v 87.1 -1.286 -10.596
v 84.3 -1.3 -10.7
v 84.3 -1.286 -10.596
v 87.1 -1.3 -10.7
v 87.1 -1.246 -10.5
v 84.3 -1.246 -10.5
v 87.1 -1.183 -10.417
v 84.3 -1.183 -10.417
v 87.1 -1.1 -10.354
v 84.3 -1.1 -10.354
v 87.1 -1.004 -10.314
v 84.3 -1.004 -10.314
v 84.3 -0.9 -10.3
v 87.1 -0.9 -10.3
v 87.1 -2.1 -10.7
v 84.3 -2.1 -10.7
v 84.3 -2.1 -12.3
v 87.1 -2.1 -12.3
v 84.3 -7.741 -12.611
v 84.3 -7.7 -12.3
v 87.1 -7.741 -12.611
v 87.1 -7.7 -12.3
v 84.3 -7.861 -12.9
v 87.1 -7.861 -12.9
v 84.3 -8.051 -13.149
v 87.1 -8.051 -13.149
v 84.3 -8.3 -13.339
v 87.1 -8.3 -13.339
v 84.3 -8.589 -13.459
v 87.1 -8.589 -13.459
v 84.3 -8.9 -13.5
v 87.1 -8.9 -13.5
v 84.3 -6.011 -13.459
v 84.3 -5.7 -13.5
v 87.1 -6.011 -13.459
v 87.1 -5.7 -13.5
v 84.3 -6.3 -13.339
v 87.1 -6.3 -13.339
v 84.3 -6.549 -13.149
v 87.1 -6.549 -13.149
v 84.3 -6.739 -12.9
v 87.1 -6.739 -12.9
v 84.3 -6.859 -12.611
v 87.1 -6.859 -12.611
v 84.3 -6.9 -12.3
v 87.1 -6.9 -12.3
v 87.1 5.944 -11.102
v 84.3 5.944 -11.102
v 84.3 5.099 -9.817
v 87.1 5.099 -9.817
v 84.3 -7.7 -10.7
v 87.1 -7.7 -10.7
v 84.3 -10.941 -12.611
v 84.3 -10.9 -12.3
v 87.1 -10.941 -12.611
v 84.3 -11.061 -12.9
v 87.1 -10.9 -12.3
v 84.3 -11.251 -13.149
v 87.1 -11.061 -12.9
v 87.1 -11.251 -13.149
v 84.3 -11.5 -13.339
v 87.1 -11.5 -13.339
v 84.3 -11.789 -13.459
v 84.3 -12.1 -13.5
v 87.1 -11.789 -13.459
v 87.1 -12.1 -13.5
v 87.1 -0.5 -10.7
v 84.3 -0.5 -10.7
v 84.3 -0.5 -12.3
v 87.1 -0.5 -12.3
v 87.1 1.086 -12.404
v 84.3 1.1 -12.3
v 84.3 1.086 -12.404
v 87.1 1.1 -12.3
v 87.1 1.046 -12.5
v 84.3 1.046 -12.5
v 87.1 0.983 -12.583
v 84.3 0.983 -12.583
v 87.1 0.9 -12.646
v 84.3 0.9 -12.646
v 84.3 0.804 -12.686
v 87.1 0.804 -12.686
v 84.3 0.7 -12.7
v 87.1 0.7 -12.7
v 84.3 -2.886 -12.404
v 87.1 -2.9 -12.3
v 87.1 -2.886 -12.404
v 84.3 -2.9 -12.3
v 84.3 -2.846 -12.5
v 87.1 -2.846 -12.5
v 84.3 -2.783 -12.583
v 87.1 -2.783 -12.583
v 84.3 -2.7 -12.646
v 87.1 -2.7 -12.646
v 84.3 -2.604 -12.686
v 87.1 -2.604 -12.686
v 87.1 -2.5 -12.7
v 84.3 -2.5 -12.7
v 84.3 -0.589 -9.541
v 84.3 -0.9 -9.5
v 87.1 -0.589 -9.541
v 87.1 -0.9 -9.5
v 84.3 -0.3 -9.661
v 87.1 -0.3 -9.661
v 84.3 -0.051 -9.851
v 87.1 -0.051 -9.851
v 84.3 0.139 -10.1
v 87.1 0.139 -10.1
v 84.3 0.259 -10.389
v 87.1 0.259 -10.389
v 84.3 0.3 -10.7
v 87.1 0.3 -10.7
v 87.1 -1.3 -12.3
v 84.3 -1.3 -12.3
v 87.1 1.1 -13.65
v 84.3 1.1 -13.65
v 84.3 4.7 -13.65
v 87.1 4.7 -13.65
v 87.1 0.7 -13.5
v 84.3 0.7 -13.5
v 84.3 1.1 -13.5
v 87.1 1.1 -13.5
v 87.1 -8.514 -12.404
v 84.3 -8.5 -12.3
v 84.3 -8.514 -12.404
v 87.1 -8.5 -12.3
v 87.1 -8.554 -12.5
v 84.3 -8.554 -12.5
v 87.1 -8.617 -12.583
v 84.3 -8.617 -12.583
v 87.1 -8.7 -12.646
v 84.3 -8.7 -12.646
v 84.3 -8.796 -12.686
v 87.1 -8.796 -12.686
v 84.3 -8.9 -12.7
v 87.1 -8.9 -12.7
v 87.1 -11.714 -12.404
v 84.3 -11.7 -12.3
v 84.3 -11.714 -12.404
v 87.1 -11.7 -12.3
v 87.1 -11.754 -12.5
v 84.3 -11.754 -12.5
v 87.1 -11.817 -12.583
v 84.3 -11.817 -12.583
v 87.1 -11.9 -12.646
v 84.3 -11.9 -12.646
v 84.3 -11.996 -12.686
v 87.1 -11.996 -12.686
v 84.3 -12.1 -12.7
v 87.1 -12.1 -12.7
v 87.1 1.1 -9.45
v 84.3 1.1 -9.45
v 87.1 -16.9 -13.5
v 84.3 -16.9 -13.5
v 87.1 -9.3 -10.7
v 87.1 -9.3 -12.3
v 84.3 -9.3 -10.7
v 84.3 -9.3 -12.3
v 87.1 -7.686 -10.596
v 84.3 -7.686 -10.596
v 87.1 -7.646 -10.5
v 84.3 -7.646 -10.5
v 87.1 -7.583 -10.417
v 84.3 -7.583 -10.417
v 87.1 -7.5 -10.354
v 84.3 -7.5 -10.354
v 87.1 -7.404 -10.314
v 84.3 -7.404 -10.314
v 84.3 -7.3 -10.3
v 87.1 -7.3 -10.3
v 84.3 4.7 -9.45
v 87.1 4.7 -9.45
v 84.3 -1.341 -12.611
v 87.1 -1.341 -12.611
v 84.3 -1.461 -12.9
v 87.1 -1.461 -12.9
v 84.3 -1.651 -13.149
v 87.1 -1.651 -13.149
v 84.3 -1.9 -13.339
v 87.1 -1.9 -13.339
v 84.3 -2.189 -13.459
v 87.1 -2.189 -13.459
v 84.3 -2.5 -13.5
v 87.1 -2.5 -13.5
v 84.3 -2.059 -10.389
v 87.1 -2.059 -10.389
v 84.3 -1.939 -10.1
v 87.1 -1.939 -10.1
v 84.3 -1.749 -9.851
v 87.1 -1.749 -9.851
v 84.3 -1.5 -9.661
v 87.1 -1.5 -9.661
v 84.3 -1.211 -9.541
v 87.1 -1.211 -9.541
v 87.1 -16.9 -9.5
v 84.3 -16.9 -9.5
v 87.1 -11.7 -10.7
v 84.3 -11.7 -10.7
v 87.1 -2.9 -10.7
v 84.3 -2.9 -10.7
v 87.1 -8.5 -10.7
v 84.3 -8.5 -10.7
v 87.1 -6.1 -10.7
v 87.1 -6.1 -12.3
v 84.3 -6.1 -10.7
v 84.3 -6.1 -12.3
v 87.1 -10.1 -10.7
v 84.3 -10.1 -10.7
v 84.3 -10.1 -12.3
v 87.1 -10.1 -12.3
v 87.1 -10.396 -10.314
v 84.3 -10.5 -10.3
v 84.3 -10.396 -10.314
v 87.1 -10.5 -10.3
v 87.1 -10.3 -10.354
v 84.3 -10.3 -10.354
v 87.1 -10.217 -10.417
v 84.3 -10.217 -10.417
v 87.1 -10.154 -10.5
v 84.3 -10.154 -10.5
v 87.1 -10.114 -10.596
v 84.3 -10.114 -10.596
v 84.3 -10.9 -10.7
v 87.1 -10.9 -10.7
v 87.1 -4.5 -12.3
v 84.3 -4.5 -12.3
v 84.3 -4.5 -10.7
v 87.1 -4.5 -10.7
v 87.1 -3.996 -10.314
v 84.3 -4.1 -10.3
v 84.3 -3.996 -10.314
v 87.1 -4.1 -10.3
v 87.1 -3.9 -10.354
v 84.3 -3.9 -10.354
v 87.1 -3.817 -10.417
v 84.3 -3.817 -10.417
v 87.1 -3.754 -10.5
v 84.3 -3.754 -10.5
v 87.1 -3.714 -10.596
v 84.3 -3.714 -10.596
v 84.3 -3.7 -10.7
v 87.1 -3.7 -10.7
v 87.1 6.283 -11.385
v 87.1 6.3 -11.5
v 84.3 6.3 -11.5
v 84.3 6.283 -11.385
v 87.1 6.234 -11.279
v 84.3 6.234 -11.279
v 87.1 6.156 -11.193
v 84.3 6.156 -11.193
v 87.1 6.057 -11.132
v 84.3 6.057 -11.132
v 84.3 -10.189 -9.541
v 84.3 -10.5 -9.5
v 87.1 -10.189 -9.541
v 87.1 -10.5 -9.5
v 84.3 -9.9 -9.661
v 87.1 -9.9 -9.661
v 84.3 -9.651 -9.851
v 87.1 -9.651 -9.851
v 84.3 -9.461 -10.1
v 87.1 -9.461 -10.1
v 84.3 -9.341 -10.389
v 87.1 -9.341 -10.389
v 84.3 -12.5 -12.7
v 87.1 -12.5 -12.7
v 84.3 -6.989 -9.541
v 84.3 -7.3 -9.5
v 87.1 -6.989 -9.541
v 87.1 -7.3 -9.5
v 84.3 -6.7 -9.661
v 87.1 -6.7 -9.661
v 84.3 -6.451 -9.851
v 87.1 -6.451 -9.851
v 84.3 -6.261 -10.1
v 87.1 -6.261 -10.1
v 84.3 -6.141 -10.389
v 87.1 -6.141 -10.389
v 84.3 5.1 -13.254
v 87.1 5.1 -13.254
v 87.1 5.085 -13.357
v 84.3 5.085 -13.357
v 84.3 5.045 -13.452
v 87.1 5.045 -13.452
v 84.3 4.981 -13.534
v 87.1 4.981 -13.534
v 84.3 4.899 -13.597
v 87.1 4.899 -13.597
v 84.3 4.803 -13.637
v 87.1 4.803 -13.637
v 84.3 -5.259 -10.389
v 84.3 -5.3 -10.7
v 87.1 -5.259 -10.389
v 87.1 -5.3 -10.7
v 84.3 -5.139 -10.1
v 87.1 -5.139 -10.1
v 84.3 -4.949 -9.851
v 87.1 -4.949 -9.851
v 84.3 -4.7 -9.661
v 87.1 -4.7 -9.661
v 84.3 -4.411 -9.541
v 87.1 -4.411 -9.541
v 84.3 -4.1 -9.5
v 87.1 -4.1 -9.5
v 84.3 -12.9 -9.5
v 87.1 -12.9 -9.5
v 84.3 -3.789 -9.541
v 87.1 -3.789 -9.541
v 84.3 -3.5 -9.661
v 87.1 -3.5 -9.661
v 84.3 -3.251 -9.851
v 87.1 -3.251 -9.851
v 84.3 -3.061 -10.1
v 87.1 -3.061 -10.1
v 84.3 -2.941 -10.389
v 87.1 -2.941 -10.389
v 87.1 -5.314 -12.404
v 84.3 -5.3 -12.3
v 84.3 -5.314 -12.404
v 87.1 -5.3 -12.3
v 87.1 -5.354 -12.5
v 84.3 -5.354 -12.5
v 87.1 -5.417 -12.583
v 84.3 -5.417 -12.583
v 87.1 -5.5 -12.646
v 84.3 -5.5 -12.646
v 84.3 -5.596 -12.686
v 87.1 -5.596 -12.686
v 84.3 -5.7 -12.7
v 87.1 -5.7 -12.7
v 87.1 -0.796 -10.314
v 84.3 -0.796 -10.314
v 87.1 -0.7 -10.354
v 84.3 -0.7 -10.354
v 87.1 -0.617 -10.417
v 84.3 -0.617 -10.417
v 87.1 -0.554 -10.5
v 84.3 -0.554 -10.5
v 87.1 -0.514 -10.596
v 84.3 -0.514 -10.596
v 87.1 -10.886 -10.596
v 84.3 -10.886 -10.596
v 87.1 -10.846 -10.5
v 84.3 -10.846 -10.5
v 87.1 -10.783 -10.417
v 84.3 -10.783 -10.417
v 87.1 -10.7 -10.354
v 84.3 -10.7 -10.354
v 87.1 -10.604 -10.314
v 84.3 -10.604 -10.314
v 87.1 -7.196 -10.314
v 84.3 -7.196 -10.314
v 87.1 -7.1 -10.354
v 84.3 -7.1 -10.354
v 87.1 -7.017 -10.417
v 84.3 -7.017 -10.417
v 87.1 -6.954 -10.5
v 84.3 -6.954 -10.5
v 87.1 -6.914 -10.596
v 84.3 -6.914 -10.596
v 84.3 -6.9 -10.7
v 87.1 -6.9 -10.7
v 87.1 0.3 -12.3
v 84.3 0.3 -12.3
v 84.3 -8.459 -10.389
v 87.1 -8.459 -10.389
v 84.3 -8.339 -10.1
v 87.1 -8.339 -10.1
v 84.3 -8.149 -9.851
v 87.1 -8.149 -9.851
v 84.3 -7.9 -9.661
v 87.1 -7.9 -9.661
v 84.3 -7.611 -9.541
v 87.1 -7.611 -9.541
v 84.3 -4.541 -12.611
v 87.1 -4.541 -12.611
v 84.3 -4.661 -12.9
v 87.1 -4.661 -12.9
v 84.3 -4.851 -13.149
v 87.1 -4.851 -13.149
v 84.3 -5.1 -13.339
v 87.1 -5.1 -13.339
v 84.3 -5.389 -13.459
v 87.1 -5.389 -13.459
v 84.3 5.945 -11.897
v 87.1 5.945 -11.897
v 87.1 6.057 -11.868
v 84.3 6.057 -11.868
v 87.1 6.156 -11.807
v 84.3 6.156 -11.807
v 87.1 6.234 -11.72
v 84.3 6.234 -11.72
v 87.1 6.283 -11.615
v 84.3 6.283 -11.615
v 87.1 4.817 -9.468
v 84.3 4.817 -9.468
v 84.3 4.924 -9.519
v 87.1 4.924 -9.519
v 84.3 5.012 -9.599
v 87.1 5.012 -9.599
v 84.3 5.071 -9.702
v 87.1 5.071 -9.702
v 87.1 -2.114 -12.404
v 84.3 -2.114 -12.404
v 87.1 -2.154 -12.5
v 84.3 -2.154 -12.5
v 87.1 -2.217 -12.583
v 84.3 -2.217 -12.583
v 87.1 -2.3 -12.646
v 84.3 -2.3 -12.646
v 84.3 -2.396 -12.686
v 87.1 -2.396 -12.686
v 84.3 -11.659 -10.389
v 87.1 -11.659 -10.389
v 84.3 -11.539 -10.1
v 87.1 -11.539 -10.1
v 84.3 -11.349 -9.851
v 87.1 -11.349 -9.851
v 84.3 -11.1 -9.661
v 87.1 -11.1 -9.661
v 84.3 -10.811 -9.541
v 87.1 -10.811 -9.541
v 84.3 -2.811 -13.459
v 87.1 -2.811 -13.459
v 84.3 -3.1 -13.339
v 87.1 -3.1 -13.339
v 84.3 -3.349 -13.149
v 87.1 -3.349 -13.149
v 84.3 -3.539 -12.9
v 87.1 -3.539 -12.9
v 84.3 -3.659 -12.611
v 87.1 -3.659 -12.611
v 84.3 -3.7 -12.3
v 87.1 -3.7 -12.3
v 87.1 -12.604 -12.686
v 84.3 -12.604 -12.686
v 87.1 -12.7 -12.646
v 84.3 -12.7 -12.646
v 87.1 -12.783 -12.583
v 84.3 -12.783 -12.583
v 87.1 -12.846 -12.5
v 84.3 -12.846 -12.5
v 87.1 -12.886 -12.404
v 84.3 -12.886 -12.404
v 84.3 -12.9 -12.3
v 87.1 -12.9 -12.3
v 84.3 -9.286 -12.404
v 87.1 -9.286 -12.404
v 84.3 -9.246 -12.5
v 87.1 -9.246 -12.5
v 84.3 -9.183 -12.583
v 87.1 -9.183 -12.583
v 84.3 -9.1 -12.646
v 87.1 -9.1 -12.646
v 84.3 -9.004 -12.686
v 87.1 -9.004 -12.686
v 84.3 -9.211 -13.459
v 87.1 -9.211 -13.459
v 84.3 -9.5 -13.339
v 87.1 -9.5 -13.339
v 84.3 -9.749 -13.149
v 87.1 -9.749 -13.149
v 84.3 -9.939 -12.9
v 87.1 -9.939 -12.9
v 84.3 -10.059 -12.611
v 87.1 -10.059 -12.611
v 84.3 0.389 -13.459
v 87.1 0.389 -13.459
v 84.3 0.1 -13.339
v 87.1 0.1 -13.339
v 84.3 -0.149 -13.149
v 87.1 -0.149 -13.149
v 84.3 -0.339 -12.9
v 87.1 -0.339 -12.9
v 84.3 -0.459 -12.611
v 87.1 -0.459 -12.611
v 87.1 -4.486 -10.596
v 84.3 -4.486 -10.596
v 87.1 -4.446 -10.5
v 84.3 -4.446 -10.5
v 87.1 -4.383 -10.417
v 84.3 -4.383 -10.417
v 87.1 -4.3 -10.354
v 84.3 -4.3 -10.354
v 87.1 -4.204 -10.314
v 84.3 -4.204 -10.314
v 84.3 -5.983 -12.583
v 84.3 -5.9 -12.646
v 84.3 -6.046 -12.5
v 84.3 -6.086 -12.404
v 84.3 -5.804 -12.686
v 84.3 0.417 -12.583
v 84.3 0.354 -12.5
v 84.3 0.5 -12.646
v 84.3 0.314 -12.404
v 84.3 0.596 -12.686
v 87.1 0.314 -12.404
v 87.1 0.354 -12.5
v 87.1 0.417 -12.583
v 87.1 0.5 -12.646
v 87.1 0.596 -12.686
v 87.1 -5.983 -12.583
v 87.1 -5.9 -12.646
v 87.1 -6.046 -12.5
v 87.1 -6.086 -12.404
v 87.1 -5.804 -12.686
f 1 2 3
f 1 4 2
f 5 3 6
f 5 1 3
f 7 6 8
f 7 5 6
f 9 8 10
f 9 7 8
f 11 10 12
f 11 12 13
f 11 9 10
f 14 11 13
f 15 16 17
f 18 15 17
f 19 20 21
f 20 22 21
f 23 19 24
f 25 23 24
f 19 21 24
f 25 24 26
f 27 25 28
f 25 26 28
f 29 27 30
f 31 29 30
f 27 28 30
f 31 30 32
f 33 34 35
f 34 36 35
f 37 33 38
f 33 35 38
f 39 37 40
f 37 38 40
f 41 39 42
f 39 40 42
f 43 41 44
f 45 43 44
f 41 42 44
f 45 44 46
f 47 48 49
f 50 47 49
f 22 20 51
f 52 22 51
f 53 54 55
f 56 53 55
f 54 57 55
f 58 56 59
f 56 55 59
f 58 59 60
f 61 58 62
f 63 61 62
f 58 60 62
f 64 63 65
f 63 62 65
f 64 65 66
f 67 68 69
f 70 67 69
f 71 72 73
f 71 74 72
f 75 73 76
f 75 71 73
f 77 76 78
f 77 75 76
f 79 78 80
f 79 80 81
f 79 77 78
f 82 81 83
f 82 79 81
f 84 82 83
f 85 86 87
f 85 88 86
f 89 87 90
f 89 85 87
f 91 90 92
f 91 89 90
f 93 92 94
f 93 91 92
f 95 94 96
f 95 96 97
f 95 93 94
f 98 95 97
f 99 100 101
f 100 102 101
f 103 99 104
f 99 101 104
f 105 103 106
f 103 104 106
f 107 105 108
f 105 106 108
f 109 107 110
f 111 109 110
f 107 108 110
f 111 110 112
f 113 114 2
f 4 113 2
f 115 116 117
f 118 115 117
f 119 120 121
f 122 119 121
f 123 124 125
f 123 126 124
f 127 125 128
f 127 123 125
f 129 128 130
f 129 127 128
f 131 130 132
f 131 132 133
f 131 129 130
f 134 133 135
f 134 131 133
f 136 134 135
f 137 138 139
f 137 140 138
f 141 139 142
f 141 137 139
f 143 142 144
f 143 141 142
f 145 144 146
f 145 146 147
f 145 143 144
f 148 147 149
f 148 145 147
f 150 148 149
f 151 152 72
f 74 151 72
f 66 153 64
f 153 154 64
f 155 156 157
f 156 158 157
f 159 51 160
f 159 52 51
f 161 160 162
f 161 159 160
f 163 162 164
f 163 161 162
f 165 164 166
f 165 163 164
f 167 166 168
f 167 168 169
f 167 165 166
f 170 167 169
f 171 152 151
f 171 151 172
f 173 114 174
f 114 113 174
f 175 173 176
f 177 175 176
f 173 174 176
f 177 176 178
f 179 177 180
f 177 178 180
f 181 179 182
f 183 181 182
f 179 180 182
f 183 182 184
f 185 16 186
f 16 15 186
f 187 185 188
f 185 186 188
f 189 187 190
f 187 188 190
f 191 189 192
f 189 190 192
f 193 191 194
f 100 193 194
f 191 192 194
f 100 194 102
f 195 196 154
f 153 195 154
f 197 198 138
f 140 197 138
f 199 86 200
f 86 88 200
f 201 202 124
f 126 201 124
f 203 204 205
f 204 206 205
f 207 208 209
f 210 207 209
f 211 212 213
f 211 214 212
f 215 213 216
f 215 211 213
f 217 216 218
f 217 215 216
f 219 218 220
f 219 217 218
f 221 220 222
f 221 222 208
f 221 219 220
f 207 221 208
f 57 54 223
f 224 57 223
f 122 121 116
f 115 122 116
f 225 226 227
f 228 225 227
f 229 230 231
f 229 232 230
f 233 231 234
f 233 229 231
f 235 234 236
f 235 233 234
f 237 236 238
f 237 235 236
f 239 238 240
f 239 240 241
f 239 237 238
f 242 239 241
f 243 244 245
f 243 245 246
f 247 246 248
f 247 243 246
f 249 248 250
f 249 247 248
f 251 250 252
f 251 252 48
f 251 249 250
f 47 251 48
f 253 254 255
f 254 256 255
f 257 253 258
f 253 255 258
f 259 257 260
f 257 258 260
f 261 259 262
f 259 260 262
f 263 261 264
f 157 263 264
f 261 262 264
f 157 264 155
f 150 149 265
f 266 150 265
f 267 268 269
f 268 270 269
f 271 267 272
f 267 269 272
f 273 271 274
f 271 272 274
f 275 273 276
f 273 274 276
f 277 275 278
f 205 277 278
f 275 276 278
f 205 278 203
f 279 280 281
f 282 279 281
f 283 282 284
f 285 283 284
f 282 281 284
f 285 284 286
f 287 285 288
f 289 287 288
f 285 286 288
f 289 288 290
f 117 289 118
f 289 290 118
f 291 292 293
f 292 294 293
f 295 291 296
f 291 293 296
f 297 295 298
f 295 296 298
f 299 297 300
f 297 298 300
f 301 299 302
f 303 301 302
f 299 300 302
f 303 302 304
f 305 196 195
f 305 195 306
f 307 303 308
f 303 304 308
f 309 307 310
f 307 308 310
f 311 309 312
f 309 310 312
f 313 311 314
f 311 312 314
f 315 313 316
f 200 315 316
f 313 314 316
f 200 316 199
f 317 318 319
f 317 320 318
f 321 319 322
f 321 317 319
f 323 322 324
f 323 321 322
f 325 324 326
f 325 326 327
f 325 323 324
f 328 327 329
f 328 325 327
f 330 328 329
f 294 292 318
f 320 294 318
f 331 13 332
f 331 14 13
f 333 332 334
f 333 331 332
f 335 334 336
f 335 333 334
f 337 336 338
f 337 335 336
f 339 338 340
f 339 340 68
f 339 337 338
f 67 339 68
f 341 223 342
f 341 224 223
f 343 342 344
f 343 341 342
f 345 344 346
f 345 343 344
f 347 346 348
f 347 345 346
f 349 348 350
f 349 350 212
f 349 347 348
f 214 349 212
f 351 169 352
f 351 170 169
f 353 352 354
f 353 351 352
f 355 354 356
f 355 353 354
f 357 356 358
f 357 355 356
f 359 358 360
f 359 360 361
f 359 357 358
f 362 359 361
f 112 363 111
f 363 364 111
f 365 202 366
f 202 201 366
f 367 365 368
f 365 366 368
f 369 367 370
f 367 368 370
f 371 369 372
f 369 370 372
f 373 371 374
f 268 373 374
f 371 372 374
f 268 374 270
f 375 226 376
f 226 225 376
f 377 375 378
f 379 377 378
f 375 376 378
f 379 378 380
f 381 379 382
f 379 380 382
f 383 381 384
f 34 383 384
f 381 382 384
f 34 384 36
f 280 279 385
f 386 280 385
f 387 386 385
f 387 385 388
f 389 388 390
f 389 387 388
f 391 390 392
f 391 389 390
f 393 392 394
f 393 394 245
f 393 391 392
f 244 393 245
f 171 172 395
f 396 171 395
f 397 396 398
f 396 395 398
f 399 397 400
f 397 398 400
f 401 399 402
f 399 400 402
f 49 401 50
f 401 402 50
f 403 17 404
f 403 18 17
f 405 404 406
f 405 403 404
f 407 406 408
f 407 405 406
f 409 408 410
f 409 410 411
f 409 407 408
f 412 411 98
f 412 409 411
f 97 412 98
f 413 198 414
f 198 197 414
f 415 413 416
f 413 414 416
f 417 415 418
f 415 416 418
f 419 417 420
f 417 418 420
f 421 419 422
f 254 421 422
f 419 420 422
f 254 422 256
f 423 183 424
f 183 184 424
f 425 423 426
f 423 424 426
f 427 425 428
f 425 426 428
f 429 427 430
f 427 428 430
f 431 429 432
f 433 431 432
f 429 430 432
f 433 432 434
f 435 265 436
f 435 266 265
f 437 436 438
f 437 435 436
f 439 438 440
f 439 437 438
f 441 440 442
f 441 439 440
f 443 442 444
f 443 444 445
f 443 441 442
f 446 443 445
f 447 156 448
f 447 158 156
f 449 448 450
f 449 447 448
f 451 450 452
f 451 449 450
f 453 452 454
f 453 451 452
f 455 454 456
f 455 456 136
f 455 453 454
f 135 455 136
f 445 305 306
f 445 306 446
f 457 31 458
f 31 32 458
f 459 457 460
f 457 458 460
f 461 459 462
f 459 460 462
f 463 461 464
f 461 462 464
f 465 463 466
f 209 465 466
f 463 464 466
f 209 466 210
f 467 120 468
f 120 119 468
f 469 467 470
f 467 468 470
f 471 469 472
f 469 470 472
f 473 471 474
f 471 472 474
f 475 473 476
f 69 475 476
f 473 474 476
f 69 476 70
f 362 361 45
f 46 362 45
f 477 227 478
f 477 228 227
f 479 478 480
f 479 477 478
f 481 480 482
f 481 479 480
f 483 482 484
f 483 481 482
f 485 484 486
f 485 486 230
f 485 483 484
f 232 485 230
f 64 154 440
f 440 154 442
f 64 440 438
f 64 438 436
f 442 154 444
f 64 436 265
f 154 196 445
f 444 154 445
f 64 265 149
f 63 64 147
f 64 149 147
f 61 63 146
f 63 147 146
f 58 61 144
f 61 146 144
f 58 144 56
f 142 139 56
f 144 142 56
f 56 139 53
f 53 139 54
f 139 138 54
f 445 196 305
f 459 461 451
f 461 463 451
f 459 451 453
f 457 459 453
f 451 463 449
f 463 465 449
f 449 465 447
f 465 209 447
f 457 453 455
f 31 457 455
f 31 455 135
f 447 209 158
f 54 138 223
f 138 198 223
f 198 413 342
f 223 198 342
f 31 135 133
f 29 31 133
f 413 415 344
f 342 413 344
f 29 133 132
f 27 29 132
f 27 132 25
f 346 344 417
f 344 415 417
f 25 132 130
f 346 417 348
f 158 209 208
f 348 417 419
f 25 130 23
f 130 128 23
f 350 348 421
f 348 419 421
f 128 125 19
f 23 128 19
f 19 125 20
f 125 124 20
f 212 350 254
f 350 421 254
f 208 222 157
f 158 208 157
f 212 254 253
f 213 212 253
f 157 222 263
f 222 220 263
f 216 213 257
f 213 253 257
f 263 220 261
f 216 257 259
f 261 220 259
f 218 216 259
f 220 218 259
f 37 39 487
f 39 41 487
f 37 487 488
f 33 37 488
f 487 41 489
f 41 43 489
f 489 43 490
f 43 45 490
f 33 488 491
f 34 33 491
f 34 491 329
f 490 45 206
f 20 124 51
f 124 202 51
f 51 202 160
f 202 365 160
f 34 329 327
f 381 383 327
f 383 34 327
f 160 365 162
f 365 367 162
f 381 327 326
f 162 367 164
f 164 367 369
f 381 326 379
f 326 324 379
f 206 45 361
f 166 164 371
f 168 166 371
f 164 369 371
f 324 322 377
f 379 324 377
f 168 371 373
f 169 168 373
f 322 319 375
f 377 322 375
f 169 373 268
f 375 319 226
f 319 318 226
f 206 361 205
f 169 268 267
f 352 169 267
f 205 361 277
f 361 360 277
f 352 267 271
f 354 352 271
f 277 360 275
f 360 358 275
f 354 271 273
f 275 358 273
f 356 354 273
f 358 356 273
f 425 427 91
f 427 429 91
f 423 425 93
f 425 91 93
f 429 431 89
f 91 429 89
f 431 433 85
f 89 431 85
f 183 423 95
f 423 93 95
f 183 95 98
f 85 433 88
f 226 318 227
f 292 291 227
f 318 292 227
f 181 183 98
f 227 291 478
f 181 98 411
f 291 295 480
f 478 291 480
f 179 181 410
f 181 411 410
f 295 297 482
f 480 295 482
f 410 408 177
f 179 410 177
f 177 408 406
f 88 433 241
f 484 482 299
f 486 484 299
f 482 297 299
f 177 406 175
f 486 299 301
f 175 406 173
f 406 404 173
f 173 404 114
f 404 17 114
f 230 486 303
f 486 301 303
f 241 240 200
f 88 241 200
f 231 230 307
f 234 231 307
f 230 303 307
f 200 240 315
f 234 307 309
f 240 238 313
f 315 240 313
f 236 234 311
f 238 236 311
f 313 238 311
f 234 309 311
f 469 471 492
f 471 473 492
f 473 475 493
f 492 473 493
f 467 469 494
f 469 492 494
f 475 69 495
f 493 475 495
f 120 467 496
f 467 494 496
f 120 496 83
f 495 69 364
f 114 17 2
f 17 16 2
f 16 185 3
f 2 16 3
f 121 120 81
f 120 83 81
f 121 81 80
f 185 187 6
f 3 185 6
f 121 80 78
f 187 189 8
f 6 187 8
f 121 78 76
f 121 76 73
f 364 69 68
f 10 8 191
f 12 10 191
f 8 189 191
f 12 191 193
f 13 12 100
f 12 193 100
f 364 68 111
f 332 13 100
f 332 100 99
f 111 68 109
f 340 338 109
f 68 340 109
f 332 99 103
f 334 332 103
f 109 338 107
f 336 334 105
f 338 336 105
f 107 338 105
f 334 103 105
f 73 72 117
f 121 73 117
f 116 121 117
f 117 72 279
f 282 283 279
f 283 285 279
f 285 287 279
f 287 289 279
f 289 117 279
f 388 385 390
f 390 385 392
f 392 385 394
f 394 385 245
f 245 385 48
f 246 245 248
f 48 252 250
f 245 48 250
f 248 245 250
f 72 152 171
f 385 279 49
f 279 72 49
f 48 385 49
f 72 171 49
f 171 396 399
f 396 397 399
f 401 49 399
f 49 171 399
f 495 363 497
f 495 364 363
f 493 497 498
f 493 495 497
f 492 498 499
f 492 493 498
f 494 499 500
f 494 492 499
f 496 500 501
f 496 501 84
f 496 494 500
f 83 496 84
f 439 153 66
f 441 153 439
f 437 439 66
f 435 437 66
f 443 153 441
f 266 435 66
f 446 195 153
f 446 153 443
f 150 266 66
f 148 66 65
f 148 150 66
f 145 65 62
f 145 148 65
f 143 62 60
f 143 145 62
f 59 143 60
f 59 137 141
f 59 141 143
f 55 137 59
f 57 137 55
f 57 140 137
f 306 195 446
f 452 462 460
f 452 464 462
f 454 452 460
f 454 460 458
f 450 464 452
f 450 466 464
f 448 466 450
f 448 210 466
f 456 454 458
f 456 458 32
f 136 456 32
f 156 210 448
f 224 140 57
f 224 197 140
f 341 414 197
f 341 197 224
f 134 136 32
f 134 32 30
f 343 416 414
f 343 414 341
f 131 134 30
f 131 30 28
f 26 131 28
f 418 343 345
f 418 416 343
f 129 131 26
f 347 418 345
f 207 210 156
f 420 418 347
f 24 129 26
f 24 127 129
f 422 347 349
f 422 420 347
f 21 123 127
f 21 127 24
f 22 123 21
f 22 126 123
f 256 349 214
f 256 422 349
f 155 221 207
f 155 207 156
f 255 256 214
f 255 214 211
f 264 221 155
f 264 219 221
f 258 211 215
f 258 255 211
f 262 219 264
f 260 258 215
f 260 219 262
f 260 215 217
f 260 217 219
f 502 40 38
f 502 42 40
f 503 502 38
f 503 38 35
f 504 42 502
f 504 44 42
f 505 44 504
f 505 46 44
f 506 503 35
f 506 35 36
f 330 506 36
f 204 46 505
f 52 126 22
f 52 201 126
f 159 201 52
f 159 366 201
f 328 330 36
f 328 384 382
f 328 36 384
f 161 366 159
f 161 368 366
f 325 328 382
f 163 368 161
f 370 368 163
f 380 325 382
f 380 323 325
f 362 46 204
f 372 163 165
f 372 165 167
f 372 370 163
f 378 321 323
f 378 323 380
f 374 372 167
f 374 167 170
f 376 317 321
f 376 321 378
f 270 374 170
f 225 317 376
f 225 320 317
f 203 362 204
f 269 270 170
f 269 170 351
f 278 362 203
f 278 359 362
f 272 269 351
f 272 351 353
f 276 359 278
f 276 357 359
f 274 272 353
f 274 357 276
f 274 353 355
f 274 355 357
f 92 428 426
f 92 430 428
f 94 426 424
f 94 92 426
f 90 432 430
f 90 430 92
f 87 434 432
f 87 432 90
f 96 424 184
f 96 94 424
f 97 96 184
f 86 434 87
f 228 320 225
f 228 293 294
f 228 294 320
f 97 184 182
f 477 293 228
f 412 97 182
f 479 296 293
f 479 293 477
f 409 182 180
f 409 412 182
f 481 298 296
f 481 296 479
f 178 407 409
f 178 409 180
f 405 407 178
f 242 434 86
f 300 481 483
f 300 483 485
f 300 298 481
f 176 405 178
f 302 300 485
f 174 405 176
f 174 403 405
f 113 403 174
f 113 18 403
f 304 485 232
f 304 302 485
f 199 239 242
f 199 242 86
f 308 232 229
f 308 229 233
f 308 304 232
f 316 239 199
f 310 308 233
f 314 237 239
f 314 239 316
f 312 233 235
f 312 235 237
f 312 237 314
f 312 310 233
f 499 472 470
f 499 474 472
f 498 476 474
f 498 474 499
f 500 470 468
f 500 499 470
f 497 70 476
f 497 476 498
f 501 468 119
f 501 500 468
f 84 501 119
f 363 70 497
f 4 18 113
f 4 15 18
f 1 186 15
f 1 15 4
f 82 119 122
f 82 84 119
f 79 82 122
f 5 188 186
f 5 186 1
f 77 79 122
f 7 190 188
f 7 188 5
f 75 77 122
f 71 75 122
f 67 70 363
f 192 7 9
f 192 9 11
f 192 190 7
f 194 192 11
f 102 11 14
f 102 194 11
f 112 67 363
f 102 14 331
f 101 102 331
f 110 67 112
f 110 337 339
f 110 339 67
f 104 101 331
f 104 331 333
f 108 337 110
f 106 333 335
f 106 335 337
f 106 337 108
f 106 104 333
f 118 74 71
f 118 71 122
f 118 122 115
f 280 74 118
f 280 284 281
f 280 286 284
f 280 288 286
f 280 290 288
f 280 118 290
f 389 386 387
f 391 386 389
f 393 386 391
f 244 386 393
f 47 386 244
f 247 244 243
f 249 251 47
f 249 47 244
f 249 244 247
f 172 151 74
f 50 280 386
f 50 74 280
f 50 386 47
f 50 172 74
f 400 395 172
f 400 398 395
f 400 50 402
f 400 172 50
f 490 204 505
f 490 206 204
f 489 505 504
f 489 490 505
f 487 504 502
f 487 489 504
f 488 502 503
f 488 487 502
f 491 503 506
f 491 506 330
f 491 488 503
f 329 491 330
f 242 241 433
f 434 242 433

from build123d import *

# Parameters (mm, degrees)
AUFSATZ_LINEAR_AUSTRAGEN3_DEPTH = 2.8
VERRUNDUNG2_R                   = 0.4
VERRUNDUNG5_R                   = 1.2
VERRUNDUNG6_R                   = 1.2
LINEARES_MUSTER1_COUNT          = 5
LINEARES_MUSTER1_PITCH          = 3.2
SKIZZE5_W                       = 4
SKIZZE5_H                       = 4
SKIZZE5_W_2                     = 4.2
AUFSATZ_LINEAR_AUSTRAGEN4_DEPTH = 2.8
VERRUNDUNG3_R                   = 0.4
VERRUNDUNG4_R                   = 0.4
VERRUNDUNG8_R                   = 1.2
FASE1_START                     = 84.3
FASE1_DEPTH                     = 2.8


with BuildPart() as part:
    # Aufsatz-Linear austragen3: read off the stored shape, not the designer's step
    # Aufsatz-Linear austragen3 outline → Aufsatz-Linear austragen3 (new body)
    with BuildSketch(Plane(origin=(84.3, 0, 0), x_dir=(0, 0, -1), z_dir=(1, 0, 0))):
        Polygon((11.9, 5.1), (11.9, 6.3), (11.1, 6.3), (11.1, 4.3), (12.7, 4.3), (12.7, 3.5), (9.5, 3.5), (9.5, 1.1), (12.7, 1.1), (12.7, -0.1), (13.5, -0.1), (13.5, 1.9), (10.3, 1.9), (10.3, 2.7), (13.5, 2.7), (13.5, 5.1), align=None)
    extrude(amount=AUFSATZ_LINEAR_AUSTRAGEN3_DEPTH)

    # Verrundung2
    verrundung2_edges = [part.edges().sort_by_distance(p)[0] for p in [
        (85.7, 1.9, -10.3),
        (85.7, 2.7, -10.3),
        (85.7, 3.5, -12.7),
        (85.7, 4.3, -12.7),
        (85.7, 6.3, -11.1),
        (85.7, 6.3, -11.9),
        (85.7, 1.1, -12.7),
    ]]
    fillet(verrundung2_edges, radius=VERRUNDUNG2_R - 0.0001)  # a hair under: the kernel refuses the full size


with BuildPart() as body_2:
    # Abspalten1: the piece on the far side of the plane
    add(part.part)
    split(bisect_by=Plane.ZX.offset(3.5), keep=Keep.BOTTOM)

    # Verrundung5
    verrundung5_edges = [body_2.edges().sort_by_distance(p)[0] for p in [
        (85.7, 1.1, -9.5),
        (85.7, 3.5, -9.5),
    ]]
    fillet(verrundung5_edges, radius=VERRUNDUNG5_R - 0.0001)  # a hair under: the kernel refuses the full size


with BuildPart() as part_1:
    add(part.part)

    # Abspalten1
    split(bisect_by=Plane.ZX.offset(3.5), keep=Keep.TOP)

    # Verrundung6
    verrundung6_edges = [part_1.edges().sort_by_distance(p)[0] for p in [
        (85.7, 5.1, -13.5),
    ]]
    fillet(verrundung6_edges, radius=VERRUNDUNG6_R)


with BuildPart() as lineares_muster1_1:
    # Lineares Muster1: pattern copy
    add(body_2.part.moved(Location(Vector(0, -1, 0) * (1 * LINEARES_MUSTER1_PITCH))))


with BuildPart() as lineares_muster1_2:
    # Lineares Muster1: pattern copy
    add(body_2.part.moved(Location(Vector(0, -1, 0) * (2 * LINEARES_MUSTER1_PITCH))))


with BuildPart() as lineares_muster1_3:
    # Lineares Muster1: pattern copy
    add(body_2.part.moved(Location(Vector(0, -1, 0) * (3 * LINEARES_MUSTER1_PITCH))))


with BuildPart() as lineares_muster1_4:
    # Lineares Muster1: pattern copy
    add(body_2.part.moved(Location(Vector(0, -1, 0) * (4 * LINEARES_MUSTER1_PITCH))))

    # Skizze5 → Aufsatz-Linear austragen4 (add)
    with BuildSketch(Plane(origin=(84.3, 0, 0), x_dir=(0, 0, -1), z_dir=(1, 0, 0))):
        with Locations((11.5, -14.9)):
            Rectangle(SKIZZE5_W, SKIZZE5_H)
        with Locations((11.55, 3.1)):
            Rectangle(SKIZZE5_W_2, SKIZZE5_H)
    extrude(amount=AUFSATZ_LINEAR_AUSTRAGEN4_DEPTH)


with BuildPart() as aufsatz_linear_austragen4_piece_1:
    # of the separate pieces the step leaves, piece 1, a body of its own (aufsatz_linear_austragen4_pieces)
    add(lineares_muster1_4.part.solids().sort_by_distance((84.3, -9.3, -10.6999))[0])

    # Verrundung3
    verrundung3_edges = [aufsatz_linear_austragen4_piece_1.edges().sort_by_distance(p)[0] for p in [
        (85.7, -12.9, -12.7),
    ]]
    fillet(verrundung3_edges, radius=VERRUNDUNG3_R)


with BuildPart() as aufsatz_linear_austragen4_piece_2:
    # of the separate pieces the step leaves, piece 2, a body of its own (aufsatz_linear_austragen4_pieces)
    add(lineares_muster1_4.part.solids().sort_by_distance((84.3, 1.1, -9.45))[0])


with BuildPart() as part_2:
    add(part_1.part)

    # Kombinieren1: union body 2, Lineares Muster1_1, Lineares Muster1_2, Lineares Muster1_3, Aufsatz-Linear austragen4 piece 1, Aufsatz-Linear austragen4 piece 2
    add(body_2.part)
    add(lineares_muster1_1.part)
    add(lineares_muster1_2.part)
    add(lineares_muster1_3.part)
    add(aufsatz_linear_austragen4_piece_1.part)
    add(aufsatz_linear_austragen4_piece_2.part)

    # Verrundung4
    verrundung4_edges = [part_2.edges().sort_by_distance(p)[0] for p in [
        (85.7, -9.3, -12.7),
        (85.7, -6.1, -12.7),
        (85.7, -2.9, -12.7),
        (85.7, 0.3, -12.7),
        (85.7, 5.1, -9.45),
        (85.7, 5.1, -13.65),
    ]]
    fillet(verrundung4_edges, radius=VERRUNDUNG4_R)

    # Verrundung8
    verrundung8_edges = [part_2.edges().sort_by_distance(p)[0] for p in [
        (85.7, -0.5, -13.5),
        (85.7, -3.7, -13.5),
        (85.7, -1.3, -13.5),
        (85.7, -6.9, -13.5),
        (85.7, -4.5, -13.5),
        (85.7, -10.1, -13.5),
        (85.7, -7.7, -13.5),
        (85.7, -10.9, -13.5),
    ]]
    fillet(verrundung8_edges, radius=VERRUNDUNG8_R - 0.0001)  # a hair under: the kernel refuses the full size

    # Fase1: read off the stored shape, not the designer's step
    # Fase1 outline → Fase1 (add)
    with BuildSketch(Plane.YZ.offset(FASE1_START)):
        with BuildLine():
            ThreePointArc((5.9, -11.1), (5.922012566, -11.100606151), (5.943958417, -11.102422765))
            Line((5.943958417, -11.102422765), (5.098633526, -9.816964992))
            ThreePointArc((5.098633526, -9.816964992), (5.099658235, -9.833468371), (5.1, -9.85))
            Line((5.1, -9.85), (5.1, -11.1))
            Line((5.1, -11.1), (5.9, -11.1))
        make_face()
        with BuildLine():
            Line((5.099976744, -13.254313255), (5.945017032, -11.897458761))
            ThreePointArc((5.945017032, -11.897458761), (5.922544351, -11.899364185), (5.9, -11.9))
            Line((5.9, -11.9), (5.1, -11.9))
            Line((5.1, -11.9), (5.1, -13.25))
            ThreePointArc((5.1, -13.25), (5.099994186, -13.252156659), (5.099976744, -13.254313255))
        make_face()
    extrude(amount=FASE1_DEPTH)


solid = part_2.part
